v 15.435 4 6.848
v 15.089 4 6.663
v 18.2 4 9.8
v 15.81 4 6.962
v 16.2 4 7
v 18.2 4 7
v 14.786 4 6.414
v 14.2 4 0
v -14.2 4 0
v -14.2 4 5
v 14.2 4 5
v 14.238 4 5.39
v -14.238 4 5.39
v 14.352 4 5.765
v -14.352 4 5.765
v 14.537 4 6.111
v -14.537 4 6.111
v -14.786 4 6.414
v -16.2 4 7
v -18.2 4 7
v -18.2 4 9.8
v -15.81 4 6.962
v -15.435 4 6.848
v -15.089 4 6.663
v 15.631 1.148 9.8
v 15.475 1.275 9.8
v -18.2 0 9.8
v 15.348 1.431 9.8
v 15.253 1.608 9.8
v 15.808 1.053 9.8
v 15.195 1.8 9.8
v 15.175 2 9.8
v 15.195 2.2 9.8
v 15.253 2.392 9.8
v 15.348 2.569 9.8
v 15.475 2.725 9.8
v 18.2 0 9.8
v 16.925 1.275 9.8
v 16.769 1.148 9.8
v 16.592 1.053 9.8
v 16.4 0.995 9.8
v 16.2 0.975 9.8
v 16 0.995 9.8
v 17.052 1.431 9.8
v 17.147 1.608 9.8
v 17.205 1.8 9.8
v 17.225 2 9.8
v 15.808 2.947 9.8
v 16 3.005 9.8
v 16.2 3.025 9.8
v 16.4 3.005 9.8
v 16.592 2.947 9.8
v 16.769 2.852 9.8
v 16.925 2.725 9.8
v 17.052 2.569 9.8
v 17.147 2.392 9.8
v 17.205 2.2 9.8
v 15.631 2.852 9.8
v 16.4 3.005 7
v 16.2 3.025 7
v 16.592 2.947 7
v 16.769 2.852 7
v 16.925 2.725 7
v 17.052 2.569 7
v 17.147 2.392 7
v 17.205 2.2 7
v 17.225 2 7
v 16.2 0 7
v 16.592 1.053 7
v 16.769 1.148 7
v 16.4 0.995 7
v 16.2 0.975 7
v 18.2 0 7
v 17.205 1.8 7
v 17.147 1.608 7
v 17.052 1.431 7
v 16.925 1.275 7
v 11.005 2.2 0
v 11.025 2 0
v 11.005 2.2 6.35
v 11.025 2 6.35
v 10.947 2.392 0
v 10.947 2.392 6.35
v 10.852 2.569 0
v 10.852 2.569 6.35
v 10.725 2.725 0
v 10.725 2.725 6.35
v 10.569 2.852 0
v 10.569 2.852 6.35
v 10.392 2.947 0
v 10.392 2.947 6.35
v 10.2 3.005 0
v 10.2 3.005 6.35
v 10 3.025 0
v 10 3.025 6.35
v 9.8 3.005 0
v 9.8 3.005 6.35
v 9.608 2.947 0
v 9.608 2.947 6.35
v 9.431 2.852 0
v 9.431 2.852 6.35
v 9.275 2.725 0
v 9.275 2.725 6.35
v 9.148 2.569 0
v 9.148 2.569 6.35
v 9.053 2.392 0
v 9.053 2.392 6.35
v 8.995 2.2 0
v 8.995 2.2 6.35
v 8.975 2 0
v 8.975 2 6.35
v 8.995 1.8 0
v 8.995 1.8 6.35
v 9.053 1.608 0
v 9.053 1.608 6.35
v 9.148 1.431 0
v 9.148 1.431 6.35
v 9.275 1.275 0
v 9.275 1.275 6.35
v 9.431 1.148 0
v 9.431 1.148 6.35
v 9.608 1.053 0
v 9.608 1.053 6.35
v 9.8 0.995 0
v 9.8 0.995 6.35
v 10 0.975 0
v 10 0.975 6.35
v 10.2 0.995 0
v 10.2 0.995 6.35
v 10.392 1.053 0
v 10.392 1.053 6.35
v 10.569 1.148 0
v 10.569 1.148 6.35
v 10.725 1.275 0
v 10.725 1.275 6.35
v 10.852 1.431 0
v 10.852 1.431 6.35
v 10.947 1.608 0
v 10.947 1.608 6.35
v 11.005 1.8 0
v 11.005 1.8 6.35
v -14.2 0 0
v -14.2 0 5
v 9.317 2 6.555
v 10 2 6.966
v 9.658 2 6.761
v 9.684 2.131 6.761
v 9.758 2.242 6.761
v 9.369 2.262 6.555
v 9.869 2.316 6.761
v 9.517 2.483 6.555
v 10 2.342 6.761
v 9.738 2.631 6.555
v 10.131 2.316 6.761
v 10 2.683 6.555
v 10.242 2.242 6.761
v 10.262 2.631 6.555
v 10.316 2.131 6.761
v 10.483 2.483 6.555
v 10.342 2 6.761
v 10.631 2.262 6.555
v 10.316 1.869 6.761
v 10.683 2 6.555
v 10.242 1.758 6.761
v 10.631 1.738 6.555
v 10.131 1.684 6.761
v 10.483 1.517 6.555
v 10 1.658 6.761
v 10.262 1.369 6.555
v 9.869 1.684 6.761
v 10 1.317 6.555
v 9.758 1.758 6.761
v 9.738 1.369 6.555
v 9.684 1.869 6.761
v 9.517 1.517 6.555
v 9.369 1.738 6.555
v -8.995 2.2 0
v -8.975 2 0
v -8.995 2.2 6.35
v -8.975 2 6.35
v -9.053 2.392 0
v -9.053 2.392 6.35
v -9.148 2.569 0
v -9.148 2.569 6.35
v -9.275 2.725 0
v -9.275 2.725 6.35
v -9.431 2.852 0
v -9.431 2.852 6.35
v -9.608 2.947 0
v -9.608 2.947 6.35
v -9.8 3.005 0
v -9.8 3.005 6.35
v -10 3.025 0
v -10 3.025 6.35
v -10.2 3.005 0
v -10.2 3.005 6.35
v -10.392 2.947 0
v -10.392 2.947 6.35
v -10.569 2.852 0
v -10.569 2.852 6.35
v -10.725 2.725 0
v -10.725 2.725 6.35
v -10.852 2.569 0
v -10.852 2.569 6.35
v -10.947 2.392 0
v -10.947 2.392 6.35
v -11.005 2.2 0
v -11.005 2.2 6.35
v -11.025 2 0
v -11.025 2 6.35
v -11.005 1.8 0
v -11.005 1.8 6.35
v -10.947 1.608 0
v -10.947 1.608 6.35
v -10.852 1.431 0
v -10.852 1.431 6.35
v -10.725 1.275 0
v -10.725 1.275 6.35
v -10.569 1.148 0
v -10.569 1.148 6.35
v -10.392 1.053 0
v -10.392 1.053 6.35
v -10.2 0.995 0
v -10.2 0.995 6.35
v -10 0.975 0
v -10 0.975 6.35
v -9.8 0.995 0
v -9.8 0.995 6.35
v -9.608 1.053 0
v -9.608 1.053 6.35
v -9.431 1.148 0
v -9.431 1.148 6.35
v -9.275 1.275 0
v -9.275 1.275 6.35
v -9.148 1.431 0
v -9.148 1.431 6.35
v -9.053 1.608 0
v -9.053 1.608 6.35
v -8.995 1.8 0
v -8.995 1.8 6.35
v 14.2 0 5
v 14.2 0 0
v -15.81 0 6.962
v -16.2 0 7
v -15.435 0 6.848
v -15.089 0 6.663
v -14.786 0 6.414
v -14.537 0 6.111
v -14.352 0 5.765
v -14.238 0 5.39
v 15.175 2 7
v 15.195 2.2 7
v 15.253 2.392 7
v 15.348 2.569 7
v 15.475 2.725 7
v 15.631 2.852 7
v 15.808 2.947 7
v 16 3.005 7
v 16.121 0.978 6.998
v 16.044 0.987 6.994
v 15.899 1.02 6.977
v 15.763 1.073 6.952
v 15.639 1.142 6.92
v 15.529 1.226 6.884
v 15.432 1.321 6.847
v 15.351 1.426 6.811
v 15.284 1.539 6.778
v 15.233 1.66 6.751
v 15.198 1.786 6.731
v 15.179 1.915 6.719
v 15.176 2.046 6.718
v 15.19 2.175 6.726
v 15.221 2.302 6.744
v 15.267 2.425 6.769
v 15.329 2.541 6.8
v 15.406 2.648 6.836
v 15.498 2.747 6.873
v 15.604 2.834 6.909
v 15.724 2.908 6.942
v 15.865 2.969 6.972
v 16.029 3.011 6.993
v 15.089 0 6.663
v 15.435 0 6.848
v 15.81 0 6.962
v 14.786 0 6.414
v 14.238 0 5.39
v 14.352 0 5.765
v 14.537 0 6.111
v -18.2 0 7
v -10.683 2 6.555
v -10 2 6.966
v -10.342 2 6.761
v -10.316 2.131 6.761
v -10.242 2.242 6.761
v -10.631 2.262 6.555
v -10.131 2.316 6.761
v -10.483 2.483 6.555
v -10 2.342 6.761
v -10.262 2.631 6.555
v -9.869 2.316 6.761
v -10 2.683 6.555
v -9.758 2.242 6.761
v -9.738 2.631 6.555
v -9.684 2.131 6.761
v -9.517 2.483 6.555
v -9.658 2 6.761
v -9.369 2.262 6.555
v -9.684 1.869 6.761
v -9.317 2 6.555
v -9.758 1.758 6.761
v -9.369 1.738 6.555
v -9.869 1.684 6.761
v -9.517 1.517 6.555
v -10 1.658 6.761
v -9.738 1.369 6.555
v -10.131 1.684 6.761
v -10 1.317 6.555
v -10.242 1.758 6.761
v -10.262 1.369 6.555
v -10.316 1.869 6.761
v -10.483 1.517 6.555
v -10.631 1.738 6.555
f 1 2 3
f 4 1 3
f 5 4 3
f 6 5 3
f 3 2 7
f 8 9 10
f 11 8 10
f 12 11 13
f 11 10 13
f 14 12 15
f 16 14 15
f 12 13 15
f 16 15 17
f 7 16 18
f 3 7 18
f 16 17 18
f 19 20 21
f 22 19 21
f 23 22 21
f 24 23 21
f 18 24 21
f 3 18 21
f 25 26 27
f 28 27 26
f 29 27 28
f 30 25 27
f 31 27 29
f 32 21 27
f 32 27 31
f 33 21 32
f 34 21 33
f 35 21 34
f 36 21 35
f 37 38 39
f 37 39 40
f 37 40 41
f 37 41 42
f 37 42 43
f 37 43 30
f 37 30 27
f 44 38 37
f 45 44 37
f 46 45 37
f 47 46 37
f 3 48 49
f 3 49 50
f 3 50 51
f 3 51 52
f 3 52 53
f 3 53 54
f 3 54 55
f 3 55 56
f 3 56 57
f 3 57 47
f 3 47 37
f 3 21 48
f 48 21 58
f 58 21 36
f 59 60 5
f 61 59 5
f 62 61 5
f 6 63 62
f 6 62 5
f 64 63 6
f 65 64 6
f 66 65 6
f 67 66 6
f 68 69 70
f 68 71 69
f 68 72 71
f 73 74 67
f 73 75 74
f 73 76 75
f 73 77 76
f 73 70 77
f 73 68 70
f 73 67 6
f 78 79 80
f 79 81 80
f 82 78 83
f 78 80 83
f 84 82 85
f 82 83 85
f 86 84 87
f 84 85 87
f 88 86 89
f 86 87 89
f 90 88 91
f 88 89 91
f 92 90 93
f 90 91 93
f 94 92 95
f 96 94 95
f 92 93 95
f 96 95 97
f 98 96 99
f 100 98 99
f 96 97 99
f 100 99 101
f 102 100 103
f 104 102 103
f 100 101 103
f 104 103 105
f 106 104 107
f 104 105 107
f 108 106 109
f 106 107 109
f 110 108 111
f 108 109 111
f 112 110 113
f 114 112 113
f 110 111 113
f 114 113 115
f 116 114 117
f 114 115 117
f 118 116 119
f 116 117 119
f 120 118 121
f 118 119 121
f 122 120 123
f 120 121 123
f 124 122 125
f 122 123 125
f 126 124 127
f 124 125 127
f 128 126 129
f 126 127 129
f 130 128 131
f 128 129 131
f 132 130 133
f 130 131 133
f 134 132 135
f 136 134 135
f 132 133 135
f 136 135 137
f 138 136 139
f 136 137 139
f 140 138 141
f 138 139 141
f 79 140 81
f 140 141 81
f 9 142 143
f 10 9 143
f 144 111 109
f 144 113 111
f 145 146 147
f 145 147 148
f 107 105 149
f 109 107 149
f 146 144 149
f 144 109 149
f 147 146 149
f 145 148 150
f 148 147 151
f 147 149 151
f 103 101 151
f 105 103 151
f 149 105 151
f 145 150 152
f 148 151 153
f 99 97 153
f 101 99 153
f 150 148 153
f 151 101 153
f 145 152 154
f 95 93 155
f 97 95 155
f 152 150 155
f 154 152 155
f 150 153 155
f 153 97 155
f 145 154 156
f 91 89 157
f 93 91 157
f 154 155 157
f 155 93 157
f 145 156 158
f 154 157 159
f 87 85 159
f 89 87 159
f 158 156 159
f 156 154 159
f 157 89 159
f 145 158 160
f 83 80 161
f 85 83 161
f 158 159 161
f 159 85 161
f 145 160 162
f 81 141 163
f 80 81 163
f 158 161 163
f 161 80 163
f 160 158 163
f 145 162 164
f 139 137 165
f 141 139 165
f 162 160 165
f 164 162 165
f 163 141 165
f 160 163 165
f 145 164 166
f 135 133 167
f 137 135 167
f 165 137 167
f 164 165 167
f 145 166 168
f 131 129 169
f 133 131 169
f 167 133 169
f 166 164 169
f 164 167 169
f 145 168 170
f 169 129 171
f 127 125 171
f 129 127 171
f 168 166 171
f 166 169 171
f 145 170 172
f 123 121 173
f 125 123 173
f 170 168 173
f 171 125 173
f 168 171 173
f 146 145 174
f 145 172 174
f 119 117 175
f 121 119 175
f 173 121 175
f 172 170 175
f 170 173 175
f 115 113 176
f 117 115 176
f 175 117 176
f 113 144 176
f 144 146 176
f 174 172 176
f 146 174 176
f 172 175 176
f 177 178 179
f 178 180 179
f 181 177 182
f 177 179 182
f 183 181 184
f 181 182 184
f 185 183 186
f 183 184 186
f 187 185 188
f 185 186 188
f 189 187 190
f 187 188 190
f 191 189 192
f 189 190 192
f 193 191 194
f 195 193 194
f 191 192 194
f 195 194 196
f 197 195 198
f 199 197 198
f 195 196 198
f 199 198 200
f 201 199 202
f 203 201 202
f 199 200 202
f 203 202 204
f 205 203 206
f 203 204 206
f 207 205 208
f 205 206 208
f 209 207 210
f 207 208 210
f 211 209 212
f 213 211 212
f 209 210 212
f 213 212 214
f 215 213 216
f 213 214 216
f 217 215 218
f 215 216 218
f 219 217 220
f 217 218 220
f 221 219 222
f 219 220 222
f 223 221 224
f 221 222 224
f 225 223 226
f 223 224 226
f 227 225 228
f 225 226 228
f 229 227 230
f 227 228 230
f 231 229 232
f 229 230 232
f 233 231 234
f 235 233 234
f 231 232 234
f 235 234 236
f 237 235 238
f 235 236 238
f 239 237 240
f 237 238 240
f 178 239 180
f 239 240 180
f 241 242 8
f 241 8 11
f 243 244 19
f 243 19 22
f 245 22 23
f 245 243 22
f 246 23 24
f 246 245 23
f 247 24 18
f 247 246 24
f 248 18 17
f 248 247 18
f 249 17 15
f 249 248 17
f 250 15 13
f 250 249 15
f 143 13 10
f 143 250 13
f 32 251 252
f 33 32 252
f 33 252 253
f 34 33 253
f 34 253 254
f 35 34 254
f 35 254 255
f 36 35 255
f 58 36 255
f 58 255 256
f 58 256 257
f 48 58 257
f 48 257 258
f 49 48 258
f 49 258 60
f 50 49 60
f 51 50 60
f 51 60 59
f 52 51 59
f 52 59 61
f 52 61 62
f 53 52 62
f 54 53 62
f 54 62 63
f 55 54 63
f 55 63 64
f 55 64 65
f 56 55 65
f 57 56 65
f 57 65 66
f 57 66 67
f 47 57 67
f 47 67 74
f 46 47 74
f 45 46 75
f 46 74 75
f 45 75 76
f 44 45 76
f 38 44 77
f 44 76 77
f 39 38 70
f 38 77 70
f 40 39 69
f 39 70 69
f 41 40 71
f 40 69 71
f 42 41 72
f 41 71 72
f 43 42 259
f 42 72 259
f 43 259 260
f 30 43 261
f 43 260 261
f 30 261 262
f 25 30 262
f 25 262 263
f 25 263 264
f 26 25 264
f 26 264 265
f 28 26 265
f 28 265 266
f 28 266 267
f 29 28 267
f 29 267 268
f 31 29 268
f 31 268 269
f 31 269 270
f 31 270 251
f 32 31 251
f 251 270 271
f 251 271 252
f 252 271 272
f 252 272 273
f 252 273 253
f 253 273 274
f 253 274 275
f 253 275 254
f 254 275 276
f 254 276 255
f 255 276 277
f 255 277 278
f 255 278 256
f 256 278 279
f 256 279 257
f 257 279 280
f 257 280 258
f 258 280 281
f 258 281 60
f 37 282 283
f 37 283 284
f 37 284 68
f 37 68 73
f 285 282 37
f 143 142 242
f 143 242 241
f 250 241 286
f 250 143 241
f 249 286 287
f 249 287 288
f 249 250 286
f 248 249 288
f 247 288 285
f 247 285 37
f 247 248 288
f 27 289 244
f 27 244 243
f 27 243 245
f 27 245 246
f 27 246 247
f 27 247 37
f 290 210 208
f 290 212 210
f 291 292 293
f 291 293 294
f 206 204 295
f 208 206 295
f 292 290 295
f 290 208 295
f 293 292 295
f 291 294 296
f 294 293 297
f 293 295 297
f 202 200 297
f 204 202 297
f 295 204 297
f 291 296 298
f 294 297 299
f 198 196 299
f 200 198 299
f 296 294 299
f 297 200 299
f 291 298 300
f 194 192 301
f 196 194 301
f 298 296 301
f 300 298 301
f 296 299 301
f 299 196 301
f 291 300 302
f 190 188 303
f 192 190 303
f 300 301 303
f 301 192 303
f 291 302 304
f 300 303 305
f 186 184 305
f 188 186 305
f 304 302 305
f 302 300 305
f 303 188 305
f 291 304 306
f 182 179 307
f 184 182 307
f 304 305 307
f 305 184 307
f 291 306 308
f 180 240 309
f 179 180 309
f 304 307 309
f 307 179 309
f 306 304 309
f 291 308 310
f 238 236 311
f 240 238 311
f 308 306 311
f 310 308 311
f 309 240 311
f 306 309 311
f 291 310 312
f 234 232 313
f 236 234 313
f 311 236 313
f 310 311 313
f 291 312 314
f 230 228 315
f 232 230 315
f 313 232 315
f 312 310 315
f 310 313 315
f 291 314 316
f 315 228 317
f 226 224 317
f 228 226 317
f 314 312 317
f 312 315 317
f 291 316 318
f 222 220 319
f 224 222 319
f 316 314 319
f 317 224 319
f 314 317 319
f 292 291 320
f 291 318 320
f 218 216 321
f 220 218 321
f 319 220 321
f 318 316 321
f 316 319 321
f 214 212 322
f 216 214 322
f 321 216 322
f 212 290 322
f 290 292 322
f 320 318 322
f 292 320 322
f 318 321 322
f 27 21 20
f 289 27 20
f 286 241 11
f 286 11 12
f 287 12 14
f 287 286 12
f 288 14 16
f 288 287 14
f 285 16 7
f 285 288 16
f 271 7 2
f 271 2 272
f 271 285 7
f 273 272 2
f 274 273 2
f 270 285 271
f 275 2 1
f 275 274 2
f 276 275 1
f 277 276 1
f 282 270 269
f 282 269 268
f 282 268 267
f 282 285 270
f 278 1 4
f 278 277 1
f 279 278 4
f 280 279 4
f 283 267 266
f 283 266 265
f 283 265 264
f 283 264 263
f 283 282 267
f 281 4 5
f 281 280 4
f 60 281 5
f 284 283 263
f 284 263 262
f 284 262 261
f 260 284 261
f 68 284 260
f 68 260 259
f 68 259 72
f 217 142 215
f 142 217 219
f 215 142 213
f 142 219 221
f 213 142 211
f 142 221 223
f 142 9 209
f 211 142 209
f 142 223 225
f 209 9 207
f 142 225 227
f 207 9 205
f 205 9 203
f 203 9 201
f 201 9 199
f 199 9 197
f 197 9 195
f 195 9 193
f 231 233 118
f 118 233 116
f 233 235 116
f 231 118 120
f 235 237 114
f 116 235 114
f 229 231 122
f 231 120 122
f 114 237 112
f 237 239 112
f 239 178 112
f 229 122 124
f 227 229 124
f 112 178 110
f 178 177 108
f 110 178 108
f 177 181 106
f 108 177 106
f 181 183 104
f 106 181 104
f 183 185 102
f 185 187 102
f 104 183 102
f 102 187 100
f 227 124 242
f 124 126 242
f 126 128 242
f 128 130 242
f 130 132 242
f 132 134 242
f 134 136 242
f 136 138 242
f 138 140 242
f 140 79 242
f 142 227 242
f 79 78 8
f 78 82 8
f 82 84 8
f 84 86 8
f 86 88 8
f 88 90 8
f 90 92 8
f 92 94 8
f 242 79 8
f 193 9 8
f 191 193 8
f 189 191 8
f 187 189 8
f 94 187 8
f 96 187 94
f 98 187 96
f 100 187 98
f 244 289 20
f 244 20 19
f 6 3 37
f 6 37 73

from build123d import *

# Parameters (mm, degrees)
SKETCH1_W                    = 36.4
SKETCH1_H                    = 9.8
BOSS_EXTRUDE1_DEPTH          = 4
SKETCH2_W                    = 4
SKETCH2_H                    = 6.999999999
CUT_EXTRUDE1_DEPTH           = 22.05421573
SKETCH3_W                    = 4
SKETCH3_H                    = 6.999999999
CUT_EXTRUDE2_DEPTH           = 22.05421573
M2_5X0_45_TAPPED_HOLE1_D     = 2.05
M2_5X0_45_TAPPED_HOLE1_DEPTH = 6.35
M2_5X0_45_TAPPED_HOLE1_TIP   = 0.615882135
M2_5X0_45_TAPPED_HOLE2_D     = 2.05
FILLET1_R                    = 2


with BuildPart() as part:
    # Sketch1 → Boss-Extrude1 (new body)
    with BuildSketch(Plane(origin=(0, 4, 0), x_dir=(1, 0, 0), z_dir=(0, 1, 0))):
        with Locations((0, -4.9)):
            Rectangle(SKETCH1_W, SKETCH1_H)
    extrude(amount=-BOSS_EXTRUDE1_DEPTH)

    # Sketch2 → Cut-Extrude1 (cut, through all)
    with BuildSketch(Plane.XZ):
        with Locations((-16.2, 3.5)):
            Rectangle(SKETCH2_W, SKETCH2_H)
    extrude(amount=-CUT_EXTRUDE1_DEPTH, mode=Mode.SUBTRACT)

    # Sketch3 → Cut-Extrude2 (cut, through all)
    with BuildSketch(Plane.XZ):
        with Locations((16.2, 3.5)):
            Rectangle(SKETCH3_W, SKETCH3_H)
    extrude(amount=-CUT_EXTRUDE2_DEPTH, mode=Mode.SUBTRACT)

    # M2.5x0.45 Tapped Hole1
    with Locations(Plane(origin=(0, 0, 0), x_dir=(-1, 0, 0), z_dir=(0, 0, -1))):
        with Locations((10, 2), (-10, 2)):
            Hole(M2_5X0_45_TAPPED_HOLE1_D / 2, depth=M2_5X0_45_TAPPED_HOLE1_DEPTH)
            with Locations((0, 0, -(M2_5X0_45_TAPPED_HOLE1_DEPTH + M2_5X0_45_TAPPED_HOLE1_TIP / 2))):  # 118° drill point
                Cone(0, M2_5X0_45_TAPPED_HOLE1_D / 2, M2_5X0_45_TAPPED_HOLE1_TIP, mode=Mode.SUBTRACT)

    # M2.5x0.45 Tapped Hole2 (through all)
    with Locations(Plane.XY.offset(9.8)):
        with Locations((16.2, 2)):
            Hole(M2_5X0_45_TAPPED_HOLE2_D / 2)

    # Fillet1
    # the kernel refuses this fillet: 2 mm, written as the material it adds along each edge
    with BuildSketch(Plane(origin=(-14.2, 0, 6.999999999), x_dir=(0, 0, -1), z_dir=(0, 1, 0))) as fillet1_piece_1:
        with BuildLine():
            CenterArc((FILLET1_R, FILLET1_R), FILLET1_R, 180, 90)
            Line((0, FILLET1_R), (0, 0))
            Line((0, 0), (FILLET1_R, 0))
        make_face()
    extrude(amount=4)
    with BuildSketch(Plane(origin=(14.2, 0, 6.999999999), x_dir=(0, 0, -1), z_dir=(0, 1, 0))) as fillet1_piece_2_section:
        with BuildLine():
            CenterArc((FILLET1_R, -FILLET1_R), FILLET1_R, 90, 90)
            Line((0, -FILLET1_R), (0, 0))
            Line((0, 0), (FILLET1_R, 0))
        make_face()
    fillet1_piece_2 = extrude(amount=4, mode=Mode.PRIVATE)
    fillet1_piece_2 = fillet1_piece_2 - Plane(origin=(16.2, 2, 6.528177275), x_dir=(-1, 0, 0), z_dir=(0, 0, -1)) * Cylinder(1.025, 16, mode=Mode.PRIVATE)
    add(fillet1_piece_2)


solid = part.part
